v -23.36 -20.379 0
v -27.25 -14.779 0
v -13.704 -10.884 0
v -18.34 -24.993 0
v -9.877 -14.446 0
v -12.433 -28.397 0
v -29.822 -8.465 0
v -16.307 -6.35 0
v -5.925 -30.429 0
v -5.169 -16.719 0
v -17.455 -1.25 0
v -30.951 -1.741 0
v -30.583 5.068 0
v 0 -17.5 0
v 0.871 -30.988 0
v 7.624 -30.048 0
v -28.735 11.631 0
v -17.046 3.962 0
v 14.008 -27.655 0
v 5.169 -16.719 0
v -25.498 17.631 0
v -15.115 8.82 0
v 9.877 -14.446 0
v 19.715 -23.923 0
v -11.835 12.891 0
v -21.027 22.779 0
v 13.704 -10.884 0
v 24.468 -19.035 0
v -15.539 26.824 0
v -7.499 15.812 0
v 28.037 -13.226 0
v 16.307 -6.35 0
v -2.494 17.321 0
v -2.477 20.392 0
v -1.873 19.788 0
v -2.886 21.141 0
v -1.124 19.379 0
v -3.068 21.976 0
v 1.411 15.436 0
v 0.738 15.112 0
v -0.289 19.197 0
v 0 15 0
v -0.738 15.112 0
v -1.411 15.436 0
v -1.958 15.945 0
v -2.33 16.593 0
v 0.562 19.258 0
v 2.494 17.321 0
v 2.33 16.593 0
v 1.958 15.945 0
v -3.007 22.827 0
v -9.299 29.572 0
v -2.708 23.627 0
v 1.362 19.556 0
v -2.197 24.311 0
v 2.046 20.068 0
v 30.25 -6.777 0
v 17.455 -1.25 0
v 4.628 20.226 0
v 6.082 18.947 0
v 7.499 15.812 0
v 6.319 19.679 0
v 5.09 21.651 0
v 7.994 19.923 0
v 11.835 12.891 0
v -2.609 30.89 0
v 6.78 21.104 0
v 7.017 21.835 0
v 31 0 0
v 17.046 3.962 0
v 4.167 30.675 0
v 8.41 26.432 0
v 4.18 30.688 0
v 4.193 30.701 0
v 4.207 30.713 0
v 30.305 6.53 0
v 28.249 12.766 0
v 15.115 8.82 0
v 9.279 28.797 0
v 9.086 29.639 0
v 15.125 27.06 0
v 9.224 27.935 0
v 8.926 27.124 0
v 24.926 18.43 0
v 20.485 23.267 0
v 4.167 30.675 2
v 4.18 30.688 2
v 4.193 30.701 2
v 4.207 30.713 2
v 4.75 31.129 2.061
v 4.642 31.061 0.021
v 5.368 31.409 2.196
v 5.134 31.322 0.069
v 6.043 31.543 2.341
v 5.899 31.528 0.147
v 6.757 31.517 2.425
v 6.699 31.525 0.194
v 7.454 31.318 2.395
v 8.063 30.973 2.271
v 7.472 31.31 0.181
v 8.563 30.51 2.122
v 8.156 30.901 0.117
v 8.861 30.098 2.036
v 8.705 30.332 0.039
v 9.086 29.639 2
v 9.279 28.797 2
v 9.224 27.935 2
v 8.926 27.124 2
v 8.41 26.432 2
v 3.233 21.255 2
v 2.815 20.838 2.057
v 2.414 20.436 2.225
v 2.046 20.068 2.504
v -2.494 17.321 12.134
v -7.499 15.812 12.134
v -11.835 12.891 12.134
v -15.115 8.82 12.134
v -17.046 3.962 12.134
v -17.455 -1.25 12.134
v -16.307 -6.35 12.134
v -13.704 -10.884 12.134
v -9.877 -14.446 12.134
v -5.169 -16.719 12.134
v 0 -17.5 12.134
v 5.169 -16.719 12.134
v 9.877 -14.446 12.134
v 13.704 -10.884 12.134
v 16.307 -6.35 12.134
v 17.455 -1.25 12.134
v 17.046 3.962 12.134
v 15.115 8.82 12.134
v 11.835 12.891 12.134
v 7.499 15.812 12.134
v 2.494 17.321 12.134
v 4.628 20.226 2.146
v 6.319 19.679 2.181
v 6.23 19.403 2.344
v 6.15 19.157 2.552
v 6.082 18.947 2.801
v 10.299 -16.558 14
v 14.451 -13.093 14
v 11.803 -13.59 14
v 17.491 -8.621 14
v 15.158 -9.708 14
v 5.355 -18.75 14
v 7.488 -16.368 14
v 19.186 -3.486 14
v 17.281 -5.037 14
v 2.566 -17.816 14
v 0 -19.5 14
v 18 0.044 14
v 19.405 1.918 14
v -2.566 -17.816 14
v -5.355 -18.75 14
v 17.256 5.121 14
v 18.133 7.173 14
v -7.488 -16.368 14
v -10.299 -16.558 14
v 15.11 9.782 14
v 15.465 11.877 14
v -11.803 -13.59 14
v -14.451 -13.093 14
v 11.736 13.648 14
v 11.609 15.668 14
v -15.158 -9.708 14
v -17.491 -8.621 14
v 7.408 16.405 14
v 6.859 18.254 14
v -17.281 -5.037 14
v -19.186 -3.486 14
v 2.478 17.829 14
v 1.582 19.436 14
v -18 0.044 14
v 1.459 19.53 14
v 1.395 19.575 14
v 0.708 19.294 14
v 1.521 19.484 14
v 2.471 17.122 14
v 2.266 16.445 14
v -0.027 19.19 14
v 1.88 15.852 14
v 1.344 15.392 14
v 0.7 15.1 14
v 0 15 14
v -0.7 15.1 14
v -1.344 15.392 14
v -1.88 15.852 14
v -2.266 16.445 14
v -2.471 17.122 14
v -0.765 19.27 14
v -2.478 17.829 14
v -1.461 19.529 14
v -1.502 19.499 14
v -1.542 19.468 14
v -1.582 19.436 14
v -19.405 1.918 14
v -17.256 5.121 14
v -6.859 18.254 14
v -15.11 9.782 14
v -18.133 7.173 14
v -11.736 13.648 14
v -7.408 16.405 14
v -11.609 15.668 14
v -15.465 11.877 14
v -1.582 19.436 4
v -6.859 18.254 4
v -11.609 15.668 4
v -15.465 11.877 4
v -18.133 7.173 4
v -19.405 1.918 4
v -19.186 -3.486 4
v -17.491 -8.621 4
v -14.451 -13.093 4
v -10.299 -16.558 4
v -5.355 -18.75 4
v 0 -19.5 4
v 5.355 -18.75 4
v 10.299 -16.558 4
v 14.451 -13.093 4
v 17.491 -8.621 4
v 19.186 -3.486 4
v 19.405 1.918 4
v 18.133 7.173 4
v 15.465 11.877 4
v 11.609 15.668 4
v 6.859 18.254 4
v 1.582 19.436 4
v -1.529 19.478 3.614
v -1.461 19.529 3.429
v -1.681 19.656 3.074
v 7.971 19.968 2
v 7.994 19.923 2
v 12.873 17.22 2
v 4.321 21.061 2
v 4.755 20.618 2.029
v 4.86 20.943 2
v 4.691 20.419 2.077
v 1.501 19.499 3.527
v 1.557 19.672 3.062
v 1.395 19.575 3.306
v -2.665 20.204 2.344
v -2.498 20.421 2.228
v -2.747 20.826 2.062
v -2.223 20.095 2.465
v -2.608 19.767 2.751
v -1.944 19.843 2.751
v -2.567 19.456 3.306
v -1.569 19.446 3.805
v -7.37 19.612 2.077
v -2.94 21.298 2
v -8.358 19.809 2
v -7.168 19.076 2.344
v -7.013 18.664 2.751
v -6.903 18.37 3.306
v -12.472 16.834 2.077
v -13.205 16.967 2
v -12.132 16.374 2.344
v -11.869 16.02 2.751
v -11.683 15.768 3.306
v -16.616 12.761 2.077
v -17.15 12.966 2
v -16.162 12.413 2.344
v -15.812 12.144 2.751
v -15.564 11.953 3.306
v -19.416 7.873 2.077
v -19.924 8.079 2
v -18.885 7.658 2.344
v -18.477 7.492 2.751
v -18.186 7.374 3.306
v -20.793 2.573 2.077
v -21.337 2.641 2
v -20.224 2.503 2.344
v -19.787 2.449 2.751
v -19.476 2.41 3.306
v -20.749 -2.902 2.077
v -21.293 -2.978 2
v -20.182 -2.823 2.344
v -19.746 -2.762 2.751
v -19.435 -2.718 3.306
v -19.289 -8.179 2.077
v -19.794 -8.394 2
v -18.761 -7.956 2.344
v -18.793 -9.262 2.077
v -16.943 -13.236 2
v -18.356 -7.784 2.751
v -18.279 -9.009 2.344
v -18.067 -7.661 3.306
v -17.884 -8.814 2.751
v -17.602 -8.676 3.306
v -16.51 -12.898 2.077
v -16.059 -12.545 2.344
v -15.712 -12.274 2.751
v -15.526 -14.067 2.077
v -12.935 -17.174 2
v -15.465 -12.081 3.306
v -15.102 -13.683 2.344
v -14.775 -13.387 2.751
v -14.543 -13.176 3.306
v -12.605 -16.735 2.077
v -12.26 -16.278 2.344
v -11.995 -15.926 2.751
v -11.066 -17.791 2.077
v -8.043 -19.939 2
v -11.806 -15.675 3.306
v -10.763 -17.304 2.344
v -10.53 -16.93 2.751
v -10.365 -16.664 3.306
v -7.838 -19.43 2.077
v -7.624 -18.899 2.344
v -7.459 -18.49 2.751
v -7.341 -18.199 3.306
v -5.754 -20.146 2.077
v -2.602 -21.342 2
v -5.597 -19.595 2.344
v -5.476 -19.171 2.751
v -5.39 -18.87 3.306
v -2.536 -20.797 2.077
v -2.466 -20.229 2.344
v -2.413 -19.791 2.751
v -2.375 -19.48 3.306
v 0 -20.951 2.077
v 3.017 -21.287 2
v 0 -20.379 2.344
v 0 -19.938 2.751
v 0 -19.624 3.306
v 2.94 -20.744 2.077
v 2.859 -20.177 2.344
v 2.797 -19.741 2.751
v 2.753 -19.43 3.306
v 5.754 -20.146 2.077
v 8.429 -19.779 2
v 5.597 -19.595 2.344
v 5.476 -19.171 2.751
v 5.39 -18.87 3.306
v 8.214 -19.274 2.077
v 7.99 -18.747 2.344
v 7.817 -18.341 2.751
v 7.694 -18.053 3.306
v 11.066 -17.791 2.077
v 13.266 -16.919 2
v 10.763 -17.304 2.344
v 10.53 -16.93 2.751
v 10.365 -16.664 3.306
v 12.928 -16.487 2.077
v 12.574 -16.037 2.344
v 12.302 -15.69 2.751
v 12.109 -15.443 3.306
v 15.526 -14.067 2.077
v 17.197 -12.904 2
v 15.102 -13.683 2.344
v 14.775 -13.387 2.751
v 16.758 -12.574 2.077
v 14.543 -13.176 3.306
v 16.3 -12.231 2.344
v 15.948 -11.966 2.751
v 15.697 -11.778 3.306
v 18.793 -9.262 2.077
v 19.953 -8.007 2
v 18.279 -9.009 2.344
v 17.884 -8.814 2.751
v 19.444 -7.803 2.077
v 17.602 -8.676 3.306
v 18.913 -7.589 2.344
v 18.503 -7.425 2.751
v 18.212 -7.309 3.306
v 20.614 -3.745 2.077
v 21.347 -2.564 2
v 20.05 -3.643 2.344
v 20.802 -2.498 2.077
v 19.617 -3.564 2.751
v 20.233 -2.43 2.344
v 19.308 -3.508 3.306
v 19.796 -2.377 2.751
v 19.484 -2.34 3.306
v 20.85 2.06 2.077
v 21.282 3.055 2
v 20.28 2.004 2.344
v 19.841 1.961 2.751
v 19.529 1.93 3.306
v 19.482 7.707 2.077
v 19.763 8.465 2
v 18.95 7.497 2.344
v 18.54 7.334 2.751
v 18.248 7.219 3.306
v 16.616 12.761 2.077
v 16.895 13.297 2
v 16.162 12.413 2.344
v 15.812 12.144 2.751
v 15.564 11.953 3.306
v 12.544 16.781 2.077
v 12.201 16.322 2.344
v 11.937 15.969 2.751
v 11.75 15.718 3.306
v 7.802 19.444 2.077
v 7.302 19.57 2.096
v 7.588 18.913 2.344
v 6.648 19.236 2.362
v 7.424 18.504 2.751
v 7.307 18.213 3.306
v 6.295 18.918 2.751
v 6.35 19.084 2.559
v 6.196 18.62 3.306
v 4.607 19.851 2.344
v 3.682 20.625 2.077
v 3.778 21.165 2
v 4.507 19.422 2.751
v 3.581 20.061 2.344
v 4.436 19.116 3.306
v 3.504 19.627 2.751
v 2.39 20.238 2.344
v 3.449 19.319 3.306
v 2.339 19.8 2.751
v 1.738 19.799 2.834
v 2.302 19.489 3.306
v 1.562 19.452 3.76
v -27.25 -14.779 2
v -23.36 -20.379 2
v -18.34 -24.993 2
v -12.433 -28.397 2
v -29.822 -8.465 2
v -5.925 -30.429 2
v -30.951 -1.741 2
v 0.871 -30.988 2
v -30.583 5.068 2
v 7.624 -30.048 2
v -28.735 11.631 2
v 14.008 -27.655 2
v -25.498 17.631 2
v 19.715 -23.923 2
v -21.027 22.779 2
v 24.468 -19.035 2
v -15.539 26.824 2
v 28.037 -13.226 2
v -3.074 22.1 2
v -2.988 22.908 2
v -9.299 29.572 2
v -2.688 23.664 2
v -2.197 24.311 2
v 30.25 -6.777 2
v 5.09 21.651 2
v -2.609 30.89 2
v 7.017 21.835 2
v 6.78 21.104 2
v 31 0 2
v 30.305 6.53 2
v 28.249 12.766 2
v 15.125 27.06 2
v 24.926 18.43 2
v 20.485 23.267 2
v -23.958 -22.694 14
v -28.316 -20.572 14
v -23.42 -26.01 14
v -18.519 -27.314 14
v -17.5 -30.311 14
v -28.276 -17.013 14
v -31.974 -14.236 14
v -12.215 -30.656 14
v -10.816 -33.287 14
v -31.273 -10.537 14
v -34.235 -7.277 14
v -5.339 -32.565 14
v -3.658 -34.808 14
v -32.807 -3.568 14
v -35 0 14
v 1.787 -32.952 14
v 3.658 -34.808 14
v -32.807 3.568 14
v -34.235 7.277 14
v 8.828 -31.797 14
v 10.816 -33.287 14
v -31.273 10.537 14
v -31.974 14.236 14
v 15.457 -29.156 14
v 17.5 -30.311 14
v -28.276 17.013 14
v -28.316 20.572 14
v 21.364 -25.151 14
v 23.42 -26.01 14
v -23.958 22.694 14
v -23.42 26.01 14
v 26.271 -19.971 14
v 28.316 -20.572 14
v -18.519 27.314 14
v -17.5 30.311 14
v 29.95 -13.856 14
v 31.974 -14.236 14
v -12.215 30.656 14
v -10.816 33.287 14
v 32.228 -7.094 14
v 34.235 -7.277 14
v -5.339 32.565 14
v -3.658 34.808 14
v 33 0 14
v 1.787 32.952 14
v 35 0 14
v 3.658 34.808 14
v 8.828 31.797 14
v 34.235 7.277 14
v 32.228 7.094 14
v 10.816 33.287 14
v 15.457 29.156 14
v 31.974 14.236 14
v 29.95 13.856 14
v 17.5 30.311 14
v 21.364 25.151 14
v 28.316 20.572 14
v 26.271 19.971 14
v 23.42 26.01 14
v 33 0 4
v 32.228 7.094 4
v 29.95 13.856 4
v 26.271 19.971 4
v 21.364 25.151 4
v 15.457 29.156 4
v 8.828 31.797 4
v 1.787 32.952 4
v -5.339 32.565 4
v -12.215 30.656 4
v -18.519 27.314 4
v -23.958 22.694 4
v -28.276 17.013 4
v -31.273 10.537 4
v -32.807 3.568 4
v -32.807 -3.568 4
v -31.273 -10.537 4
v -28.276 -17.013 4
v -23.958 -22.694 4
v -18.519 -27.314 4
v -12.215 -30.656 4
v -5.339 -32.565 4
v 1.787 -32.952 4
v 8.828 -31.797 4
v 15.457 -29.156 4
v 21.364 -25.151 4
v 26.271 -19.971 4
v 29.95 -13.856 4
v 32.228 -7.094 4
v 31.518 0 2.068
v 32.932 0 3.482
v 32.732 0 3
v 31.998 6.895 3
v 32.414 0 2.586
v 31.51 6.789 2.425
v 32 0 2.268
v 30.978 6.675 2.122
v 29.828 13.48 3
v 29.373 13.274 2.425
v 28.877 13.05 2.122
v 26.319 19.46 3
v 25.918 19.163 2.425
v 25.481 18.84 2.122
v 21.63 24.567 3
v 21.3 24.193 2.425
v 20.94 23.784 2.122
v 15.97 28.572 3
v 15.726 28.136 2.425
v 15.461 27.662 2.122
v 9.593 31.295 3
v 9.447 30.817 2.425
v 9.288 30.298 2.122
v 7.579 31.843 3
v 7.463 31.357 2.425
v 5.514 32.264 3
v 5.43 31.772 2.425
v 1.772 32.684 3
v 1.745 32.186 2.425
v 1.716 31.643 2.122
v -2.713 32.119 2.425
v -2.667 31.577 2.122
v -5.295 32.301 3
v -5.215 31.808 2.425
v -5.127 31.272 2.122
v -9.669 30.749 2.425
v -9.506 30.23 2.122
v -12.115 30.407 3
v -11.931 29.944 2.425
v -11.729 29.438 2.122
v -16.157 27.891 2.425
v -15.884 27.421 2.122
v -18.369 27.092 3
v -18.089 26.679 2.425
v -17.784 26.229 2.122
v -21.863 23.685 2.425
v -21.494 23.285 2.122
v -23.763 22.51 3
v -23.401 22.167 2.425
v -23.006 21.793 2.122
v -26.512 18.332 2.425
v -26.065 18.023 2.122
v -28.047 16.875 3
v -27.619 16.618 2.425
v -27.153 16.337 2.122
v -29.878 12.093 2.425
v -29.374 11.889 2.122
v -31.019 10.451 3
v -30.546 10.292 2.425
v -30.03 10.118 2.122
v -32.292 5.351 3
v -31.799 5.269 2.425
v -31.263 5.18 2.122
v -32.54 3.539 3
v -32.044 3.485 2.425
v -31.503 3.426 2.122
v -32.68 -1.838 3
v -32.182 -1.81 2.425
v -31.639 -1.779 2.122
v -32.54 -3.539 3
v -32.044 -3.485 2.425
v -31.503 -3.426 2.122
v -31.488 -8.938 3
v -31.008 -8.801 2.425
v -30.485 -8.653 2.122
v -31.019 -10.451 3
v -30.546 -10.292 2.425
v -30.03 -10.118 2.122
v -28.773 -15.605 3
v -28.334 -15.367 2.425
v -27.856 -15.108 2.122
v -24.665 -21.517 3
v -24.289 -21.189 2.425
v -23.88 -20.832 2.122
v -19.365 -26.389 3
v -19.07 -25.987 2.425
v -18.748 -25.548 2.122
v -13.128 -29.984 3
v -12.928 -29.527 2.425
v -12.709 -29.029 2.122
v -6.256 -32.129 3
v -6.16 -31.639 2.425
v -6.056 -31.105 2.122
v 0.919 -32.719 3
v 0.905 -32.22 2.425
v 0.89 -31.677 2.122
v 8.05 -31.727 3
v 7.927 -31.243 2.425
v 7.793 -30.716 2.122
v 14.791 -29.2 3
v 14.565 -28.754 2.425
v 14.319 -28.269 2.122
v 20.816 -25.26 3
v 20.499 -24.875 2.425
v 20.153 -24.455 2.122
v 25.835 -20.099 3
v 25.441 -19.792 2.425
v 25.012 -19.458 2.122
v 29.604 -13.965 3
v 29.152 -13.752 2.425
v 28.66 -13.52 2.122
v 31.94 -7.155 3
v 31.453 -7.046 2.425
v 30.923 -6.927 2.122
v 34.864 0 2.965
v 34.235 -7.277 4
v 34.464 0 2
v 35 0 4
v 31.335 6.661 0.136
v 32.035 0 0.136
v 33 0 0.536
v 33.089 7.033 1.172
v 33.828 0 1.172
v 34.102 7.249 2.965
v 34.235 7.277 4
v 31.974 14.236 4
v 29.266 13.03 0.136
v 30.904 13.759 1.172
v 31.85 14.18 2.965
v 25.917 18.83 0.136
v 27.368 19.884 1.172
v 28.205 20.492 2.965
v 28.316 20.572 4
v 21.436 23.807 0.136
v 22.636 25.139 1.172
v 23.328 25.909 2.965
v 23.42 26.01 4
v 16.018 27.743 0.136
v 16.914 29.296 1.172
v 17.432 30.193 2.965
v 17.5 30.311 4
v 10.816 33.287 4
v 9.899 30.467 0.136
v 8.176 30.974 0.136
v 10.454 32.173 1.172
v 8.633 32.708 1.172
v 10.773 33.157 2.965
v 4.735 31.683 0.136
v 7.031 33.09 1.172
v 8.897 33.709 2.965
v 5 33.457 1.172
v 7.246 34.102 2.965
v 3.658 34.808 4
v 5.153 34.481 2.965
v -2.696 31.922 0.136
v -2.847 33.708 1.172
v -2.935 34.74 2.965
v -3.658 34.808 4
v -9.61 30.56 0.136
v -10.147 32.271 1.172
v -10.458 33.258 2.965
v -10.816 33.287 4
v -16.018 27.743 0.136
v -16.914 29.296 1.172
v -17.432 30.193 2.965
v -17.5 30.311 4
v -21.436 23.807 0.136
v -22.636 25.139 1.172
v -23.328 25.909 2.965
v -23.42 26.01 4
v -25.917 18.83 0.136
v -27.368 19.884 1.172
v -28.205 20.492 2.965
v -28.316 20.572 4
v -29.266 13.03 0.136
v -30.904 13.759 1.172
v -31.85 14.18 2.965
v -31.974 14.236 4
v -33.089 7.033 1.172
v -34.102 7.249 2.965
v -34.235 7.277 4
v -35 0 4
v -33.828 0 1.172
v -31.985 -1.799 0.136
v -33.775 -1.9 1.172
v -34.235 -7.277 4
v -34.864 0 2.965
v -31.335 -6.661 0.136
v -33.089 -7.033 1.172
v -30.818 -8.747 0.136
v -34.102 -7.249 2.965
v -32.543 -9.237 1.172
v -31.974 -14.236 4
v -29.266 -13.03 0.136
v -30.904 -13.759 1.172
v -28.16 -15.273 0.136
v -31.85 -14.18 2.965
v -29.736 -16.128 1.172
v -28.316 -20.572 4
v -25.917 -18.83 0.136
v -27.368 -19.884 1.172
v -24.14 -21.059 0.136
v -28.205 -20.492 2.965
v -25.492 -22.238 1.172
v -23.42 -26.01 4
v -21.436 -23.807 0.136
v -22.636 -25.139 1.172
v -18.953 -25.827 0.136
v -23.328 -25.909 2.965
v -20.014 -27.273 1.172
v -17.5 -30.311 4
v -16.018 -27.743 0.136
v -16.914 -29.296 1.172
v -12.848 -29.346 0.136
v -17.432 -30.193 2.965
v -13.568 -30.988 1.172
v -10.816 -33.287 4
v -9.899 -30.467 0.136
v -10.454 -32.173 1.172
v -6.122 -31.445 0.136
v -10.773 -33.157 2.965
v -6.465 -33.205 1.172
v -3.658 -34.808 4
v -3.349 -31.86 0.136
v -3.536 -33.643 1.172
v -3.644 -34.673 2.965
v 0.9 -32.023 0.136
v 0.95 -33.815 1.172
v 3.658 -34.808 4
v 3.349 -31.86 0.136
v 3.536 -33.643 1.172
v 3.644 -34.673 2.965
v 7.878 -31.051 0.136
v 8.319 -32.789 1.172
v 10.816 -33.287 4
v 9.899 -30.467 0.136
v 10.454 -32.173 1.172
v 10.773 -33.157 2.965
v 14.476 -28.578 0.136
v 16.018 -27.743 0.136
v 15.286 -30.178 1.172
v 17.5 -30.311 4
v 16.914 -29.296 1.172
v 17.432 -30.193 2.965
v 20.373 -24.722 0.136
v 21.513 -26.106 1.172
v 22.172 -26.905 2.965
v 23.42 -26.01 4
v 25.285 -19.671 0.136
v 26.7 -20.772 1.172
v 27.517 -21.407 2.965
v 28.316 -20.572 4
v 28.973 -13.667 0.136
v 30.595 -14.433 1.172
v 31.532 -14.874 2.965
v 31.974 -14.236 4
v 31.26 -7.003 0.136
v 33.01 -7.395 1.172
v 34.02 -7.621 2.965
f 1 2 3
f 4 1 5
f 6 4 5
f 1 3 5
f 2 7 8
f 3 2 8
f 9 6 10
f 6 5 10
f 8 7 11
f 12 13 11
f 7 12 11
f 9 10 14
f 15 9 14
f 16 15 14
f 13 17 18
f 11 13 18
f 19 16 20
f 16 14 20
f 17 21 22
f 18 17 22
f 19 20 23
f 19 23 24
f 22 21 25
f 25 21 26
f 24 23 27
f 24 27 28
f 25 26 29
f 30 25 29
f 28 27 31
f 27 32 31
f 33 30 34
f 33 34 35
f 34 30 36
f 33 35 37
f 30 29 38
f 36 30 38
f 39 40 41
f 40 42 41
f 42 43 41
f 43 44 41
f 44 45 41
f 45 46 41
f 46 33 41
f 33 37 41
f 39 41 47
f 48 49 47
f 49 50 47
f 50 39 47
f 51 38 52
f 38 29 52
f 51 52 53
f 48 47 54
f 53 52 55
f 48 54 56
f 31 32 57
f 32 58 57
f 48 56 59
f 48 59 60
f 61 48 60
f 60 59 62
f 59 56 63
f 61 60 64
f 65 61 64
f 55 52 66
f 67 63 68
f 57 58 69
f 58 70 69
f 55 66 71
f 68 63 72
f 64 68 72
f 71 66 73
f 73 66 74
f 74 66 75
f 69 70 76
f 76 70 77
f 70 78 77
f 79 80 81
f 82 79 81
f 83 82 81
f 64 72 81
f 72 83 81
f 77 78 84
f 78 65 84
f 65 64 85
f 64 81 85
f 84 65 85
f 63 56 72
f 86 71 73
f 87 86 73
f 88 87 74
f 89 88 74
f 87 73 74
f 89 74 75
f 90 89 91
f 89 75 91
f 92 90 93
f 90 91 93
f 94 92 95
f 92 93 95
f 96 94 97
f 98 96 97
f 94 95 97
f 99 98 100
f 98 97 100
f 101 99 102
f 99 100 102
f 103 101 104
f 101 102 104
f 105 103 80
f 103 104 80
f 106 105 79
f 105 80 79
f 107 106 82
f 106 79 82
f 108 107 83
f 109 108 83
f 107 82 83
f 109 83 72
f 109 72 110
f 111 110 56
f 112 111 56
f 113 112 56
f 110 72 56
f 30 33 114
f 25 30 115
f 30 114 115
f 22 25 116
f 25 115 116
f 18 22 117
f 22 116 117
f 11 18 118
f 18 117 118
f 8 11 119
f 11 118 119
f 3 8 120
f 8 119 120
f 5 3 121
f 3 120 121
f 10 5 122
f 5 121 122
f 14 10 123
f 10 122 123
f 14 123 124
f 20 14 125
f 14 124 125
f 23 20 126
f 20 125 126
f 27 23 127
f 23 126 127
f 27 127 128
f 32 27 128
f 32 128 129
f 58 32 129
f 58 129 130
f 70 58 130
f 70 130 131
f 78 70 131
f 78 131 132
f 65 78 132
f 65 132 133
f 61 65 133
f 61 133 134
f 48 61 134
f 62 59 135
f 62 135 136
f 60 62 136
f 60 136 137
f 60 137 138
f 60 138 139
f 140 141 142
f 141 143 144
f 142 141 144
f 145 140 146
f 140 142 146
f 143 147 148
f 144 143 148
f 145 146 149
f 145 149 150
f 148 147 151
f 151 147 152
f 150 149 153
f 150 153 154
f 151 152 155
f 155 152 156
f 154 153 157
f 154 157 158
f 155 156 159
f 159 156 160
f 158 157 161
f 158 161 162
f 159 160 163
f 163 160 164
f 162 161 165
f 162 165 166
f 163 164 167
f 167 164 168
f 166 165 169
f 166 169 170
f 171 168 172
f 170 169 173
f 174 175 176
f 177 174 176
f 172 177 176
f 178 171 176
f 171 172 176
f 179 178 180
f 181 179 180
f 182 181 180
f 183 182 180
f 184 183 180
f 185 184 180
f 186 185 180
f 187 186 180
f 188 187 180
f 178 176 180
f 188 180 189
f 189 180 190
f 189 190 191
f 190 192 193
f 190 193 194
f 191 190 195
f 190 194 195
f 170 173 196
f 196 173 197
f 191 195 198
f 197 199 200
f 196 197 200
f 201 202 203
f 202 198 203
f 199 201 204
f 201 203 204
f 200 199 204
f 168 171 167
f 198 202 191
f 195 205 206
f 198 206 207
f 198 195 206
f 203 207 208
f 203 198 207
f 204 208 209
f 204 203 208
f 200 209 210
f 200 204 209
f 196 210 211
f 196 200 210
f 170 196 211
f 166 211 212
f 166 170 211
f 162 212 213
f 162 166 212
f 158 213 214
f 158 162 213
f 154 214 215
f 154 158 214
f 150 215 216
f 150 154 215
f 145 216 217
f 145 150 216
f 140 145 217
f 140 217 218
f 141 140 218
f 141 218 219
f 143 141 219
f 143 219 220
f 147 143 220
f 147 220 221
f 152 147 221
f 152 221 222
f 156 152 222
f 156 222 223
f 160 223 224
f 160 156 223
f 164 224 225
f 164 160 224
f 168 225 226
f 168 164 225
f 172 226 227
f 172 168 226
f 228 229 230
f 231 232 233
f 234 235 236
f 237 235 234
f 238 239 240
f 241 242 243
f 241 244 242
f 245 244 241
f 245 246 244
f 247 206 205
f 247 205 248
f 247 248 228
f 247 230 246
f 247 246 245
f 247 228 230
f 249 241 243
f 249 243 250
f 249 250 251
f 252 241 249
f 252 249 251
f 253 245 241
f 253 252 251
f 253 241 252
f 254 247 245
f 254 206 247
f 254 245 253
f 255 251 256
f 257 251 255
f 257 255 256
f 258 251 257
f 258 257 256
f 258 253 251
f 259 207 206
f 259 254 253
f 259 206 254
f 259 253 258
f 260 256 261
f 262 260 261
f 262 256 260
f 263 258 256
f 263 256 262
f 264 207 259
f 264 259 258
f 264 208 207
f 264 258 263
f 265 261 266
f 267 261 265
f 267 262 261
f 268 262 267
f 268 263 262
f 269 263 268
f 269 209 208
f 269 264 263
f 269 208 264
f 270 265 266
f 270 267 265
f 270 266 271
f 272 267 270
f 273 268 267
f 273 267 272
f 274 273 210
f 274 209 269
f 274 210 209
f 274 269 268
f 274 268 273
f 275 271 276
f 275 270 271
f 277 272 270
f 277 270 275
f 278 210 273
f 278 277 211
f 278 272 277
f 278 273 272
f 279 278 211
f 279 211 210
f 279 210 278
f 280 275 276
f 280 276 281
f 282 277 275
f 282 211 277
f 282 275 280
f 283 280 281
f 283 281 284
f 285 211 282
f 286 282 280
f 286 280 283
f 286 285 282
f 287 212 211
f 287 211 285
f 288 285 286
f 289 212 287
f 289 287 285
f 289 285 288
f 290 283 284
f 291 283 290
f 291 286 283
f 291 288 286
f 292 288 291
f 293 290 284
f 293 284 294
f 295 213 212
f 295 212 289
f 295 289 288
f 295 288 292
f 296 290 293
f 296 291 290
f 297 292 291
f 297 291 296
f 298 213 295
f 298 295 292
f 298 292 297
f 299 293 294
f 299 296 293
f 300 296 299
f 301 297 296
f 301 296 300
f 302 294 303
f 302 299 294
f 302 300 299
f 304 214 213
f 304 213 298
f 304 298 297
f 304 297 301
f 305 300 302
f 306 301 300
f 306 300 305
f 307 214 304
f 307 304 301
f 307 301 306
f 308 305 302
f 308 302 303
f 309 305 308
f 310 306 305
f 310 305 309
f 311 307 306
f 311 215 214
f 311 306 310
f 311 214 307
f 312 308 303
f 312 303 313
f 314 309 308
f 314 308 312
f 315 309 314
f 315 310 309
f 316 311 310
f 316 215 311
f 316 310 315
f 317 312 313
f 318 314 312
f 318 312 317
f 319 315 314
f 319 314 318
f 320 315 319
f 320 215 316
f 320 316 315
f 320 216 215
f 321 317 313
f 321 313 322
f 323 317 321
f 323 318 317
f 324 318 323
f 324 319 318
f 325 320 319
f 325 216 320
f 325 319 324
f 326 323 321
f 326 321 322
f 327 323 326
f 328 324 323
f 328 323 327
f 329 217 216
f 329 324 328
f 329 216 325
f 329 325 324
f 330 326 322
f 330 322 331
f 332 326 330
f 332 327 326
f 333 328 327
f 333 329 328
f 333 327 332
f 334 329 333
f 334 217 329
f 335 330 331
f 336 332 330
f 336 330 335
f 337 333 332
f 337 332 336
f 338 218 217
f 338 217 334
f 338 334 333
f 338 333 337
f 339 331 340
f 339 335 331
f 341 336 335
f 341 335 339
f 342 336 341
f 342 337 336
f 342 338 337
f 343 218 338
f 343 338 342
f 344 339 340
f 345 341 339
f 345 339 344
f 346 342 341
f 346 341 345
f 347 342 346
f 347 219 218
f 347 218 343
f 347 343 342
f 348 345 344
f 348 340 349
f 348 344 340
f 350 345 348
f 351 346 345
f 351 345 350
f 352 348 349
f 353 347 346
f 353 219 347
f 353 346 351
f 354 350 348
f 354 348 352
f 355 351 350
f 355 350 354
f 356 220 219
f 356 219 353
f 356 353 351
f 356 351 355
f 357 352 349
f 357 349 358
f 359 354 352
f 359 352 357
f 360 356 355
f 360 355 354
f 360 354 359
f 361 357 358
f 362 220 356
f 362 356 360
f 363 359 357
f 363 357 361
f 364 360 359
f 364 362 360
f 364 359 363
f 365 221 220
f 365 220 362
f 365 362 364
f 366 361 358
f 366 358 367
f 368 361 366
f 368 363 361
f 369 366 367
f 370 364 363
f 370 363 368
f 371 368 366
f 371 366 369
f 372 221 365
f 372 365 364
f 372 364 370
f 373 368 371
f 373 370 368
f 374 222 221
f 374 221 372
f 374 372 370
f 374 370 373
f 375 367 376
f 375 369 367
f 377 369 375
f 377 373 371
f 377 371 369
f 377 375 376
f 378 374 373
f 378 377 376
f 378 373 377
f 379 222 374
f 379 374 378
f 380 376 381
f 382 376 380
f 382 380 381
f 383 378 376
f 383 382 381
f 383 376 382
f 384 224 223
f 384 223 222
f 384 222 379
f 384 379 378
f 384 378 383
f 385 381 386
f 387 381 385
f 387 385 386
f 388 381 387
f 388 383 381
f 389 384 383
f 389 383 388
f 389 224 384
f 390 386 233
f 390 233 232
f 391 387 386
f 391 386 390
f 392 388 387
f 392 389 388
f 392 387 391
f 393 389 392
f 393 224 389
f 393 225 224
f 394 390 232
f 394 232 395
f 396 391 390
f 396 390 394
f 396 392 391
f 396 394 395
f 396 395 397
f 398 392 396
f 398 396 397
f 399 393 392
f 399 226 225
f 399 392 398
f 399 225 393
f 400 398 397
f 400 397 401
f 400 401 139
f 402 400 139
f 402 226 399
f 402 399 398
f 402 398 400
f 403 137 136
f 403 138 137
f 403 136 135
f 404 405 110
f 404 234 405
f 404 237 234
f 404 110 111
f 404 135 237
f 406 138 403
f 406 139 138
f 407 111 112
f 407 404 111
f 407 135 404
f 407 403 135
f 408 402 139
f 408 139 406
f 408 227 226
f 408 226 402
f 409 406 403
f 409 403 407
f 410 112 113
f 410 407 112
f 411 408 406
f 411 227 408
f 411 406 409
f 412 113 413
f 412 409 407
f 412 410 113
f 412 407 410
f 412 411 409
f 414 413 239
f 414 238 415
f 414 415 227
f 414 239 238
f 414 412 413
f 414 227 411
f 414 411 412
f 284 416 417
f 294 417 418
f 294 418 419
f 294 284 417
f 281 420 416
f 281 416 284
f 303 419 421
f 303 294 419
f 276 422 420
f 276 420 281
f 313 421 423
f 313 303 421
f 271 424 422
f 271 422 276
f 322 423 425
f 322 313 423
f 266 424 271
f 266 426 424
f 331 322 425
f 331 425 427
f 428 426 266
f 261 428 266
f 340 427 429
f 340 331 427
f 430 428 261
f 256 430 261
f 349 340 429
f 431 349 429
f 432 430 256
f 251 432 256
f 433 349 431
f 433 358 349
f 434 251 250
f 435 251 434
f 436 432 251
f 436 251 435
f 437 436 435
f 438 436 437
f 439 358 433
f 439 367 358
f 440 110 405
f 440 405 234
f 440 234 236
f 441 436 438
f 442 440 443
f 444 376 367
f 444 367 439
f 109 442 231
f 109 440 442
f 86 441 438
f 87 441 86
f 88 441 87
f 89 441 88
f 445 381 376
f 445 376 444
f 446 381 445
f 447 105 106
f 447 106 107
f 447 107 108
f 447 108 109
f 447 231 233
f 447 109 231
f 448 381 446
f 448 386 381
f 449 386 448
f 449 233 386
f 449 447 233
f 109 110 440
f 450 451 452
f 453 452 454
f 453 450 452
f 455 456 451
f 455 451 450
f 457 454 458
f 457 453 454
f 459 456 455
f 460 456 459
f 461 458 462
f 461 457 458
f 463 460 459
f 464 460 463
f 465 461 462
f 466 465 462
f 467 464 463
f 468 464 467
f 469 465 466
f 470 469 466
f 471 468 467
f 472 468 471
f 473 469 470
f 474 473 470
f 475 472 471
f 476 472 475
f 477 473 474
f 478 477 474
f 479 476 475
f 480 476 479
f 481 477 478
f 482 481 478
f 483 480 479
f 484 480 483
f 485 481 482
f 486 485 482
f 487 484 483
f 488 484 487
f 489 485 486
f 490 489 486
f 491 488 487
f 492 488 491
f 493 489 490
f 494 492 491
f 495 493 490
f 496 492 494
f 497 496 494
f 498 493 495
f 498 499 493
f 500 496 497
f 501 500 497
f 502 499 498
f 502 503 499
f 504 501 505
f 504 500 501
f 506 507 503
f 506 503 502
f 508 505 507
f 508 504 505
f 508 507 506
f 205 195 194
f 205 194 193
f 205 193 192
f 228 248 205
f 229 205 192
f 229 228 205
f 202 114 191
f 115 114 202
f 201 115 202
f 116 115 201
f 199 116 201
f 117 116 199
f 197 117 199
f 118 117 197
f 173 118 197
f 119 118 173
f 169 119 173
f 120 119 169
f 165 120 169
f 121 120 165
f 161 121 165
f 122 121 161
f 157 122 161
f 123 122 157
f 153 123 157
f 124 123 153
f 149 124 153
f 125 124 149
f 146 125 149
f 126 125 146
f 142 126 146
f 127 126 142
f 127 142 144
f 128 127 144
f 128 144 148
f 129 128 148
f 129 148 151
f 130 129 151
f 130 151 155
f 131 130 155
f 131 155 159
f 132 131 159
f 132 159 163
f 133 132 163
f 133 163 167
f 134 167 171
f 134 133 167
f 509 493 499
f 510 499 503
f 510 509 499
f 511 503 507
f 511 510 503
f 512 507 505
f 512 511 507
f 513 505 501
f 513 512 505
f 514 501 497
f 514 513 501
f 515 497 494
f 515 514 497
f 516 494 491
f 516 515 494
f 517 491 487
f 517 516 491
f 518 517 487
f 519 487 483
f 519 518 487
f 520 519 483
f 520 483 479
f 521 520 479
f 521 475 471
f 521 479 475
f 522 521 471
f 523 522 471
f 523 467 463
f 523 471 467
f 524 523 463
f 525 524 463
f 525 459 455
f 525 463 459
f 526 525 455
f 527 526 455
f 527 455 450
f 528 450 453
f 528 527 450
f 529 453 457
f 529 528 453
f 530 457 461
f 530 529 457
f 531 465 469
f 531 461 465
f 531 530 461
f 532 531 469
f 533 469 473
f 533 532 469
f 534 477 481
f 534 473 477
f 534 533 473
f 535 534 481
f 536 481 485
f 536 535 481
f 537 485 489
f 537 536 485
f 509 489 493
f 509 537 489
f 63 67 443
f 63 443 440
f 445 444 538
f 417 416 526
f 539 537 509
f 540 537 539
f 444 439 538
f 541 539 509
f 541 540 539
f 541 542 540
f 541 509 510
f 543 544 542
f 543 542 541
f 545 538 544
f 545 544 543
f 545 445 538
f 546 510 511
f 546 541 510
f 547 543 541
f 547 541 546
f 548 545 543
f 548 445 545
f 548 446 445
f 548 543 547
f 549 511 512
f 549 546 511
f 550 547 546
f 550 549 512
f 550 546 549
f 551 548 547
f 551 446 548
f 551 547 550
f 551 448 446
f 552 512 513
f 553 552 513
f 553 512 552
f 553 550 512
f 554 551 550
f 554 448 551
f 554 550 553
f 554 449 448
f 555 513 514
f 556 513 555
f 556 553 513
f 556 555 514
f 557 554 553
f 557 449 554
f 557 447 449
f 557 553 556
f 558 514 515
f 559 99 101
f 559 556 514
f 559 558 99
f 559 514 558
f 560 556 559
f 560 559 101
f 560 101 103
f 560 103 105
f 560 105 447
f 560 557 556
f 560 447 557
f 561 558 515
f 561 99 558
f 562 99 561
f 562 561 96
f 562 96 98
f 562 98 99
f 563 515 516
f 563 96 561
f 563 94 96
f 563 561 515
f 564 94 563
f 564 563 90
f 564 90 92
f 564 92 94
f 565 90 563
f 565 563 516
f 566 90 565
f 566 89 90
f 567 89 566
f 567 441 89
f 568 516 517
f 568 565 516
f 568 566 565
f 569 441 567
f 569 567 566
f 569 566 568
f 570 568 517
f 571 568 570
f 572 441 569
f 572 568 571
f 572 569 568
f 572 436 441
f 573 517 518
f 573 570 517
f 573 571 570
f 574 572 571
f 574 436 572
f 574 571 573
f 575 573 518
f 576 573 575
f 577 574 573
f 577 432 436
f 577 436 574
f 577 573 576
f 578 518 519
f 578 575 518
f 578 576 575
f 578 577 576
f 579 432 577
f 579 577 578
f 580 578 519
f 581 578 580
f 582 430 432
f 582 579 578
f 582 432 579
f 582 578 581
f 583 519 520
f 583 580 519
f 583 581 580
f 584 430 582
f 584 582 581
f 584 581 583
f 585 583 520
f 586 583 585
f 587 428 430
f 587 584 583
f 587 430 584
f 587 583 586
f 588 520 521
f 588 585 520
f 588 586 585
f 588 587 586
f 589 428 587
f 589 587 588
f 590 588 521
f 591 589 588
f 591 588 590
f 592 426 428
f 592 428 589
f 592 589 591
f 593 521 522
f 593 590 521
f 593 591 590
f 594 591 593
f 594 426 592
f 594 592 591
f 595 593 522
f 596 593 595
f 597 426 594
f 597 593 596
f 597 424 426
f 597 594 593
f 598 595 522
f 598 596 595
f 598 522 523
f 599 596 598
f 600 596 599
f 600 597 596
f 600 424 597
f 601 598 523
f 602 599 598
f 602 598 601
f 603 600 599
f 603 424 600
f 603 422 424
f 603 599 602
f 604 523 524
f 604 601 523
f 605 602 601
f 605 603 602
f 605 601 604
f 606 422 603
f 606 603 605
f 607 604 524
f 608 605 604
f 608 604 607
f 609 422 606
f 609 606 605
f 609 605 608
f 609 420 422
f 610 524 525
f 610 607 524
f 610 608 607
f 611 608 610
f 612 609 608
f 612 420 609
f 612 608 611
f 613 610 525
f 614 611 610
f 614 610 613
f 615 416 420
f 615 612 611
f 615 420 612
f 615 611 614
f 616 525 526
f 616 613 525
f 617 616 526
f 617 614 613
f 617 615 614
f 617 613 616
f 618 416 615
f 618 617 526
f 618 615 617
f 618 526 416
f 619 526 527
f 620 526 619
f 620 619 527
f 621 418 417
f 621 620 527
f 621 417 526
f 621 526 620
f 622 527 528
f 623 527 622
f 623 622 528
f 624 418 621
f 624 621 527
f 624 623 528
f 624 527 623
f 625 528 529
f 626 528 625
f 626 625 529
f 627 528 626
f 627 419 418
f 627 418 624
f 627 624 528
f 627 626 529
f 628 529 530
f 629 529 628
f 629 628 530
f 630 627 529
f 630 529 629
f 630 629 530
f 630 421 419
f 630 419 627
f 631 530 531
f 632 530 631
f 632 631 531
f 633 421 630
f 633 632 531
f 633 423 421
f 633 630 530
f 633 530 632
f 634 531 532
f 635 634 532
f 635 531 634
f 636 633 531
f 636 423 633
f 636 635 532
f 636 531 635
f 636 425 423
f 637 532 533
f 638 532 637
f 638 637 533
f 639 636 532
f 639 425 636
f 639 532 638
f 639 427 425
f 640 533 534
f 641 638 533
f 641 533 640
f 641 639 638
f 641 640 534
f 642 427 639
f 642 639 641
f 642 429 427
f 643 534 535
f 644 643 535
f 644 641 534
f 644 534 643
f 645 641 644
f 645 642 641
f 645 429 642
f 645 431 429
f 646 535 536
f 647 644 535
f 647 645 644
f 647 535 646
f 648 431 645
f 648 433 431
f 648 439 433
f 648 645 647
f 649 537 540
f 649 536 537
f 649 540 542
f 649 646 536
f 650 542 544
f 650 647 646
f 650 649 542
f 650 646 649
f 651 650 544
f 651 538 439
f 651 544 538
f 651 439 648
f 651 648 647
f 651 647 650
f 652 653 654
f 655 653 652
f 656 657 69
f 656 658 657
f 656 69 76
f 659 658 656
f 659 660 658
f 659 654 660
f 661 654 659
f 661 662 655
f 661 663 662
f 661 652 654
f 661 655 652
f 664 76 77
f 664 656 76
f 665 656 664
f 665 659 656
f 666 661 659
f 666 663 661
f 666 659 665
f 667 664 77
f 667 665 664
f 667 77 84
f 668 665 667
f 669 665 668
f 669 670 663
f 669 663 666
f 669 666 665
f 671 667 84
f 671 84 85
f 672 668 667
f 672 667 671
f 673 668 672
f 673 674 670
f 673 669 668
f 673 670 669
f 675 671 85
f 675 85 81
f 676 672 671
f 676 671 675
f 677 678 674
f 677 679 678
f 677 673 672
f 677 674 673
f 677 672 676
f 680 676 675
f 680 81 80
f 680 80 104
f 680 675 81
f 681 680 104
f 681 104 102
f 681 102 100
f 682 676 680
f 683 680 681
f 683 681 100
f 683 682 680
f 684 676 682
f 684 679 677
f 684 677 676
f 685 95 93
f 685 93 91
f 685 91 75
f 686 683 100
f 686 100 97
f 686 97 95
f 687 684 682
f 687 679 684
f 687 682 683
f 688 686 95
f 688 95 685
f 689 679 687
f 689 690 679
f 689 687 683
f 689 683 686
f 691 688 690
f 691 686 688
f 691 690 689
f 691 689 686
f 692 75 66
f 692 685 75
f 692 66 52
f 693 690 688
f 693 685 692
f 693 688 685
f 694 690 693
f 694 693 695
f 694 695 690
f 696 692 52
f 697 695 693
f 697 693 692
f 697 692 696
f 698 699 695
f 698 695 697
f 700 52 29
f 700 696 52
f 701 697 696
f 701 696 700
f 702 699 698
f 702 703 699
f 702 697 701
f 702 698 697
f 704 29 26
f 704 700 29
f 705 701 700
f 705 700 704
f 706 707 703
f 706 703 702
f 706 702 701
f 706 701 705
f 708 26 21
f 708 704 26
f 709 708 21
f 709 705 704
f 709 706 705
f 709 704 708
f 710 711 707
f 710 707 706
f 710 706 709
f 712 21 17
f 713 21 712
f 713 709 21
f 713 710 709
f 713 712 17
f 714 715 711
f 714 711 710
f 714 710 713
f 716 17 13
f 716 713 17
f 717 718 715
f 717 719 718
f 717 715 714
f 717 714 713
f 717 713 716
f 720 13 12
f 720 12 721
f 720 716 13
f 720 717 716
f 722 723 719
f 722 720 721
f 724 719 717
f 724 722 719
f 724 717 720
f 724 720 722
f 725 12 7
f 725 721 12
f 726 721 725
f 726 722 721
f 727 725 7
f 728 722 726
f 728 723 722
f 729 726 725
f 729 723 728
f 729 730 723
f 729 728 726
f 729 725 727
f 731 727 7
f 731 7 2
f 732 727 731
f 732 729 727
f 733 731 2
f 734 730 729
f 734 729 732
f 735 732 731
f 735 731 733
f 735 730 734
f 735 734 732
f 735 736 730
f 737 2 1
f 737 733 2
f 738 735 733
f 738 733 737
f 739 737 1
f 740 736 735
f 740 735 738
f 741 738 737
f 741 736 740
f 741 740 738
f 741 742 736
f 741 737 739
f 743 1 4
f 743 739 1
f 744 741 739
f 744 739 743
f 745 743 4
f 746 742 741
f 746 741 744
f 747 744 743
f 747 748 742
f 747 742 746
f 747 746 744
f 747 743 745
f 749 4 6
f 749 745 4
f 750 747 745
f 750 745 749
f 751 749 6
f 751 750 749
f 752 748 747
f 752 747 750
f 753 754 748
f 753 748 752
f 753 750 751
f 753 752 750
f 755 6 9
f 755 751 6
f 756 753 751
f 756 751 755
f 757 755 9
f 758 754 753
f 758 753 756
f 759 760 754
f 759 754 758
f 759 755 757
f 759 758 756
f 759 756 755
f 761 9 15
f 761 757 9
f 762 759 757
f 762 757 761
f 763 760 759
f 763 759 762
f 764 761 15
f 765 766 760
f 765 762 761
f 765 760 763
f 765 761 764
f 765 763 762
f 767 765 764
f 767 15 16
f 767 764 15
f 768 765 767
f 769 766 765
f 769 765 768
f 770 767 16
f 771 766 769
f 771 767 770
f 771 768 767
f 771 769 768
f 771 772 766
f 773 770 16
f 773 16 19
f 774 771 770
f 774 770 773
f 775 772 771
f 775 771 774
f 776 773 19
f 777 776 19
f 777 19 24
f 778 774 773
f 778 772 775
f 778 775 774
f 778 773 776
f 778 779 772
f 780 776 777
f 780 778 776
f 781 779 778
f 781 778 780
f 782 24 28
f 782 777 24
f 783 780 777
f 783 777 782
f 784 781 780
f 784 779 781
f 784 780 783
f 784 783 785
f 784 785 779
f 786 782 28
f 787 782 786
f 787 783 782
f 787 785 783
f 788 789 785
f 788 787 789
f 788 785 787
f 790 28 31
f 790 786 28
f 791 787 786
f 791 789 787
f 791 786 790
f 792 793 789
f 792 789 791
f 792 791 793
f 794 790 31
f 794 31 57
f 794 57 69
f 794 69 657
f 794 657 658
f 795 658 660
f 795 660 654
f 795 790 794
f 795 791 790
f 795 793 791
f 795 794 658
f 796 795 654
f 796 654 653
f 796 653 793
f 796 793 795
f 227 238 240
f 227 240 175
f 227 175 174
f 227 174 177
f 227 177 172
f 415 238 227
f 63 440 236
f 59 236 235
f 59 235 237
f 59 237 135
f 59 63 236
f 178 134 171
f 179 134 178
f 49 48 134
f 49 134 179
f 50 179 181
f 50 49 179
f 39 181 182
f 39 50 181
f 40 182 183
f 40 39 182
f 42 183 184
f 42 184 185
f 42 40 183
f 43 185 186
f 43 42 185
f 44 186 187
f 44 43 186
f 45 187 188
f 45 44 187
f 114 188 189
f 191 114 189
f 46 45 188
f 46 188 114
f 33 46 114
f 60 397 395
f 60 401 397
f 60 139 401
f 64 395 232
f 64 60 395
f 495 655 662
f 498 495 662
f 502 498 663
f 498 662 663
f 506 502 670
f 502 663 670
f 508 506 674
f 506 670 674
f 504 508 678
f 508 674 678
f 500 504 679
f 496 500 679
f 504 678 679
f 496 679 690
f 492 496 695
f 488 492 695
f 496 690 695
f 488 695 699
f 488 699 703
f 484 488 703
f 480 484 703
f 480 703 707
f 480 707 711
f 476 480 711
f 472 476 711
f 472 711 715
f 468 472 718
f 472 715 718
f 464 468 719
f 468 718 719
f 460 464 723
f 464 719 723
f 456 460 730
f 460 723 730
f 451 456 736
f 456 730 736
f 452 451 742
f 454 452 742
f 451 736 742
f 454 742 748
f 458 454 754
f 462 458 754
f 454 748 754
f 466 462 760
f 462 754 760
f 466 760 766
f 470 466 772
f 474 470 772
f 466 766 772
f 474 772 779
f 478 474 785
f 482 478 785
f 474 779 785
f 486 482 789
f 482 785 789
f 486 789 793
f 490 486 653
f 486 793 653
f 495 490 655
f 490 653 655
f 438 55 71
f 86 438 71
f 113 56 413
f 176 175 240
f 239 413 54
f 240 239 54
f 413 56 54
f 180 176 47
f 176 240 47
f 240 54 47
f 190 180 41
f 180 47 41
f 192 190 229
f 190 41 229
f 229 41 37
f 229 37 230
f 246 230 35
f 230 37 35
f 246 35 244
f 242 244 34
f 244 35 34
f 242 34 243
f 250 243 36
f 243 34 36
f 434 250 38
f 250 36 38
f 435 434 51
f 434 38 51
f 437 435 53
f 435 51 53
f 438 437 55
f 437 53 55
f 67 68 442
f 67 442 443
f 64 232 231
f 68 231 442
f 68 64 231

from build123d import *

# Parameters (mm, degrees)
CROQUIS1_R                 = 35
SALIENTE_EXTRUIR1_DEPTH    = 14
CROQUIS2_R                 = 17.5
CORTAR_EXTRUIR1_DEPTH      = 52.439284598
VACIADO1_T                 = -2
CHAFL_N1_SIZE              = 0.5
CHAFL_N1_SIZE2             = 1.866025404
CROQUIS5_R                 = 2.5
SALIENTE_EXTRUIR2_DEPTH    = 14
REDONDEO2_R                = 4
CORTAR_EXTRUIR2_DEPTH      = 51.931326337
CORTAR_EXTRUIR2_DEPTH_BACK = 51.931326337
CORTAR_EXTRUIR3_DEPTH      = 51.931326474
CORTAR_EXTRUIR3_DEPTH_BACK = 51.931326474


with BuildPart() as part:
    # Croquis1 → Saliente-Extruir1 (new body)
    with BuildSketch(Plane.XY):
        Circle(CROQUIS1_R)
    extrude(amount=SALIENTE_EXTRUIR1_DEPTH)

    # Croquis2 → Cortar-Extruir1 (cut, through all)
    with BuildSketch(Plane.XY.offset(14)):
        Circle(CROQUIS2_R)
    extrude(amount=-CORTAR_EXTRUIR1_DEPTH, mode=Mode.SUBTRACT)

    # Vaciado1
    vaciado1_openings = [part.faces().sort_by_distance(p)[0] for p in [
        (-34.010050506, 0, 14),
    ]]
    offset(amount=VACIADO1_T, openings=vaciado1_openings, kind=Kind.INTERSECTION)

    # Chaflán1
    chafl_n1_edges = [part.edges().sort_by_distance(p)[0] for p in [
        (-17.5, 0, 14),
    ]]
    chafl_n1_side = [part.faces().sort_by_distance(p)[0] for p in [
        (-18.948456711, 0, 14),
    ]]
    chamfer(chafl_n1_edges, length=CHAFL_N1_SIZE, length2=CHAFL_N1_SIZE2, reference=chafl_n1_side[0])

    # Croquis5 → Saliente-Extruir2 (add, through all)
    with BuildSketch(Plane(origin=(0, 0, 0), x_dir=(-1, 0, 0), z_dir=(0, 0, -1))):
        with Locations((0, 17.5)):
            Circle(CROQUIS5_R)
    extrude(amount=-SALIENTE_EXTRUIR2_DEPTH)

    # Redondeo1: read off the stored shape, not the designer's step
    # Redondeo1 outline → Redondeo1 (revolve)
    with BuildSketch(Plane.XZ):
        with BuildLine():
            ThreePointArc((21.5, 2), (20.085786438, 2.585786438), (19.5, 4))
            Line((19.5, 4), (19.5, 2))
            Line((19.5, 2), (21.5, 2))
        make_face()
        with BuildLine():
            ThreePointArc((33, 4), (32.414213562, 2.585786438), (31, 2))
            Line((31, 2), (33, 2))
            Line((33, 2), (33, 4))
        make_face()
    revolve(axis=Axis((0, 0, 0), (0, 0, 1)))

    # Redondeo2
    redondeo2_edges = [part.edges().sort_by_distance(p)[0] for p in [
        (-35, 0, 0),
    ]]
    fillet(redondeo2_edges, radius=REDONDEO2_R)

    # Croquis3 → Cortar-Extruir2 (cut, two sides: drawn at the far end of the back side and taken through both)
    with BuildSketch(Plane.XY.offset(2).offset(-CORTAR_EXTRUIR2_DEPTH_BACK)):
        with BuildLine():
            Line((8.410016673, 26.432172655), (2.046055643, 20.068211625))
            ThreePointArc((2.046055643, 20.068211625), (-2.196585045, 20.068211625), (-2.196585045, 24.310852312))
            Line((-2.196585045, 24.310852312), (4.167375986, 30.674813342))
            ThreePointArc((4.167375986, 30.674813342), (8.410016673, 30.674813342), (8.410016673, 26.432172655))
        make_face()
    extrude(amount=CORTAR_EXTRUIR2_DEPTH + CORTAR_EXTRUIR2_DEPTH_BACK, mode=Mode.SUBTRACT)

    # Croquis4 → Cortar-Extruir3 (cut, two sides: drawn at the far end of the back side and taken through both)
    with BuildSketch(Plane.XY.offset(2).offset(-CORTAR_EXTRUIR3_DEPTH_BACK)):
        Polygon((5.089600939, 21.651424089), (4.627973548, 20.226390042), (6.318861503, 19.678641589), (6.081885084, 18.947100367), (7.993733444, 19.923368498), (7.017465313, 21.835216858), (6.780488894, 21.103675636), align=None)
    extrude(amount=CORTAR_EXTRUIR3_DEPTH + CORTAR_EXTRUIR3_DEPTH_BACK, mode=Mode.SUBTRACT)


solid = part.part
